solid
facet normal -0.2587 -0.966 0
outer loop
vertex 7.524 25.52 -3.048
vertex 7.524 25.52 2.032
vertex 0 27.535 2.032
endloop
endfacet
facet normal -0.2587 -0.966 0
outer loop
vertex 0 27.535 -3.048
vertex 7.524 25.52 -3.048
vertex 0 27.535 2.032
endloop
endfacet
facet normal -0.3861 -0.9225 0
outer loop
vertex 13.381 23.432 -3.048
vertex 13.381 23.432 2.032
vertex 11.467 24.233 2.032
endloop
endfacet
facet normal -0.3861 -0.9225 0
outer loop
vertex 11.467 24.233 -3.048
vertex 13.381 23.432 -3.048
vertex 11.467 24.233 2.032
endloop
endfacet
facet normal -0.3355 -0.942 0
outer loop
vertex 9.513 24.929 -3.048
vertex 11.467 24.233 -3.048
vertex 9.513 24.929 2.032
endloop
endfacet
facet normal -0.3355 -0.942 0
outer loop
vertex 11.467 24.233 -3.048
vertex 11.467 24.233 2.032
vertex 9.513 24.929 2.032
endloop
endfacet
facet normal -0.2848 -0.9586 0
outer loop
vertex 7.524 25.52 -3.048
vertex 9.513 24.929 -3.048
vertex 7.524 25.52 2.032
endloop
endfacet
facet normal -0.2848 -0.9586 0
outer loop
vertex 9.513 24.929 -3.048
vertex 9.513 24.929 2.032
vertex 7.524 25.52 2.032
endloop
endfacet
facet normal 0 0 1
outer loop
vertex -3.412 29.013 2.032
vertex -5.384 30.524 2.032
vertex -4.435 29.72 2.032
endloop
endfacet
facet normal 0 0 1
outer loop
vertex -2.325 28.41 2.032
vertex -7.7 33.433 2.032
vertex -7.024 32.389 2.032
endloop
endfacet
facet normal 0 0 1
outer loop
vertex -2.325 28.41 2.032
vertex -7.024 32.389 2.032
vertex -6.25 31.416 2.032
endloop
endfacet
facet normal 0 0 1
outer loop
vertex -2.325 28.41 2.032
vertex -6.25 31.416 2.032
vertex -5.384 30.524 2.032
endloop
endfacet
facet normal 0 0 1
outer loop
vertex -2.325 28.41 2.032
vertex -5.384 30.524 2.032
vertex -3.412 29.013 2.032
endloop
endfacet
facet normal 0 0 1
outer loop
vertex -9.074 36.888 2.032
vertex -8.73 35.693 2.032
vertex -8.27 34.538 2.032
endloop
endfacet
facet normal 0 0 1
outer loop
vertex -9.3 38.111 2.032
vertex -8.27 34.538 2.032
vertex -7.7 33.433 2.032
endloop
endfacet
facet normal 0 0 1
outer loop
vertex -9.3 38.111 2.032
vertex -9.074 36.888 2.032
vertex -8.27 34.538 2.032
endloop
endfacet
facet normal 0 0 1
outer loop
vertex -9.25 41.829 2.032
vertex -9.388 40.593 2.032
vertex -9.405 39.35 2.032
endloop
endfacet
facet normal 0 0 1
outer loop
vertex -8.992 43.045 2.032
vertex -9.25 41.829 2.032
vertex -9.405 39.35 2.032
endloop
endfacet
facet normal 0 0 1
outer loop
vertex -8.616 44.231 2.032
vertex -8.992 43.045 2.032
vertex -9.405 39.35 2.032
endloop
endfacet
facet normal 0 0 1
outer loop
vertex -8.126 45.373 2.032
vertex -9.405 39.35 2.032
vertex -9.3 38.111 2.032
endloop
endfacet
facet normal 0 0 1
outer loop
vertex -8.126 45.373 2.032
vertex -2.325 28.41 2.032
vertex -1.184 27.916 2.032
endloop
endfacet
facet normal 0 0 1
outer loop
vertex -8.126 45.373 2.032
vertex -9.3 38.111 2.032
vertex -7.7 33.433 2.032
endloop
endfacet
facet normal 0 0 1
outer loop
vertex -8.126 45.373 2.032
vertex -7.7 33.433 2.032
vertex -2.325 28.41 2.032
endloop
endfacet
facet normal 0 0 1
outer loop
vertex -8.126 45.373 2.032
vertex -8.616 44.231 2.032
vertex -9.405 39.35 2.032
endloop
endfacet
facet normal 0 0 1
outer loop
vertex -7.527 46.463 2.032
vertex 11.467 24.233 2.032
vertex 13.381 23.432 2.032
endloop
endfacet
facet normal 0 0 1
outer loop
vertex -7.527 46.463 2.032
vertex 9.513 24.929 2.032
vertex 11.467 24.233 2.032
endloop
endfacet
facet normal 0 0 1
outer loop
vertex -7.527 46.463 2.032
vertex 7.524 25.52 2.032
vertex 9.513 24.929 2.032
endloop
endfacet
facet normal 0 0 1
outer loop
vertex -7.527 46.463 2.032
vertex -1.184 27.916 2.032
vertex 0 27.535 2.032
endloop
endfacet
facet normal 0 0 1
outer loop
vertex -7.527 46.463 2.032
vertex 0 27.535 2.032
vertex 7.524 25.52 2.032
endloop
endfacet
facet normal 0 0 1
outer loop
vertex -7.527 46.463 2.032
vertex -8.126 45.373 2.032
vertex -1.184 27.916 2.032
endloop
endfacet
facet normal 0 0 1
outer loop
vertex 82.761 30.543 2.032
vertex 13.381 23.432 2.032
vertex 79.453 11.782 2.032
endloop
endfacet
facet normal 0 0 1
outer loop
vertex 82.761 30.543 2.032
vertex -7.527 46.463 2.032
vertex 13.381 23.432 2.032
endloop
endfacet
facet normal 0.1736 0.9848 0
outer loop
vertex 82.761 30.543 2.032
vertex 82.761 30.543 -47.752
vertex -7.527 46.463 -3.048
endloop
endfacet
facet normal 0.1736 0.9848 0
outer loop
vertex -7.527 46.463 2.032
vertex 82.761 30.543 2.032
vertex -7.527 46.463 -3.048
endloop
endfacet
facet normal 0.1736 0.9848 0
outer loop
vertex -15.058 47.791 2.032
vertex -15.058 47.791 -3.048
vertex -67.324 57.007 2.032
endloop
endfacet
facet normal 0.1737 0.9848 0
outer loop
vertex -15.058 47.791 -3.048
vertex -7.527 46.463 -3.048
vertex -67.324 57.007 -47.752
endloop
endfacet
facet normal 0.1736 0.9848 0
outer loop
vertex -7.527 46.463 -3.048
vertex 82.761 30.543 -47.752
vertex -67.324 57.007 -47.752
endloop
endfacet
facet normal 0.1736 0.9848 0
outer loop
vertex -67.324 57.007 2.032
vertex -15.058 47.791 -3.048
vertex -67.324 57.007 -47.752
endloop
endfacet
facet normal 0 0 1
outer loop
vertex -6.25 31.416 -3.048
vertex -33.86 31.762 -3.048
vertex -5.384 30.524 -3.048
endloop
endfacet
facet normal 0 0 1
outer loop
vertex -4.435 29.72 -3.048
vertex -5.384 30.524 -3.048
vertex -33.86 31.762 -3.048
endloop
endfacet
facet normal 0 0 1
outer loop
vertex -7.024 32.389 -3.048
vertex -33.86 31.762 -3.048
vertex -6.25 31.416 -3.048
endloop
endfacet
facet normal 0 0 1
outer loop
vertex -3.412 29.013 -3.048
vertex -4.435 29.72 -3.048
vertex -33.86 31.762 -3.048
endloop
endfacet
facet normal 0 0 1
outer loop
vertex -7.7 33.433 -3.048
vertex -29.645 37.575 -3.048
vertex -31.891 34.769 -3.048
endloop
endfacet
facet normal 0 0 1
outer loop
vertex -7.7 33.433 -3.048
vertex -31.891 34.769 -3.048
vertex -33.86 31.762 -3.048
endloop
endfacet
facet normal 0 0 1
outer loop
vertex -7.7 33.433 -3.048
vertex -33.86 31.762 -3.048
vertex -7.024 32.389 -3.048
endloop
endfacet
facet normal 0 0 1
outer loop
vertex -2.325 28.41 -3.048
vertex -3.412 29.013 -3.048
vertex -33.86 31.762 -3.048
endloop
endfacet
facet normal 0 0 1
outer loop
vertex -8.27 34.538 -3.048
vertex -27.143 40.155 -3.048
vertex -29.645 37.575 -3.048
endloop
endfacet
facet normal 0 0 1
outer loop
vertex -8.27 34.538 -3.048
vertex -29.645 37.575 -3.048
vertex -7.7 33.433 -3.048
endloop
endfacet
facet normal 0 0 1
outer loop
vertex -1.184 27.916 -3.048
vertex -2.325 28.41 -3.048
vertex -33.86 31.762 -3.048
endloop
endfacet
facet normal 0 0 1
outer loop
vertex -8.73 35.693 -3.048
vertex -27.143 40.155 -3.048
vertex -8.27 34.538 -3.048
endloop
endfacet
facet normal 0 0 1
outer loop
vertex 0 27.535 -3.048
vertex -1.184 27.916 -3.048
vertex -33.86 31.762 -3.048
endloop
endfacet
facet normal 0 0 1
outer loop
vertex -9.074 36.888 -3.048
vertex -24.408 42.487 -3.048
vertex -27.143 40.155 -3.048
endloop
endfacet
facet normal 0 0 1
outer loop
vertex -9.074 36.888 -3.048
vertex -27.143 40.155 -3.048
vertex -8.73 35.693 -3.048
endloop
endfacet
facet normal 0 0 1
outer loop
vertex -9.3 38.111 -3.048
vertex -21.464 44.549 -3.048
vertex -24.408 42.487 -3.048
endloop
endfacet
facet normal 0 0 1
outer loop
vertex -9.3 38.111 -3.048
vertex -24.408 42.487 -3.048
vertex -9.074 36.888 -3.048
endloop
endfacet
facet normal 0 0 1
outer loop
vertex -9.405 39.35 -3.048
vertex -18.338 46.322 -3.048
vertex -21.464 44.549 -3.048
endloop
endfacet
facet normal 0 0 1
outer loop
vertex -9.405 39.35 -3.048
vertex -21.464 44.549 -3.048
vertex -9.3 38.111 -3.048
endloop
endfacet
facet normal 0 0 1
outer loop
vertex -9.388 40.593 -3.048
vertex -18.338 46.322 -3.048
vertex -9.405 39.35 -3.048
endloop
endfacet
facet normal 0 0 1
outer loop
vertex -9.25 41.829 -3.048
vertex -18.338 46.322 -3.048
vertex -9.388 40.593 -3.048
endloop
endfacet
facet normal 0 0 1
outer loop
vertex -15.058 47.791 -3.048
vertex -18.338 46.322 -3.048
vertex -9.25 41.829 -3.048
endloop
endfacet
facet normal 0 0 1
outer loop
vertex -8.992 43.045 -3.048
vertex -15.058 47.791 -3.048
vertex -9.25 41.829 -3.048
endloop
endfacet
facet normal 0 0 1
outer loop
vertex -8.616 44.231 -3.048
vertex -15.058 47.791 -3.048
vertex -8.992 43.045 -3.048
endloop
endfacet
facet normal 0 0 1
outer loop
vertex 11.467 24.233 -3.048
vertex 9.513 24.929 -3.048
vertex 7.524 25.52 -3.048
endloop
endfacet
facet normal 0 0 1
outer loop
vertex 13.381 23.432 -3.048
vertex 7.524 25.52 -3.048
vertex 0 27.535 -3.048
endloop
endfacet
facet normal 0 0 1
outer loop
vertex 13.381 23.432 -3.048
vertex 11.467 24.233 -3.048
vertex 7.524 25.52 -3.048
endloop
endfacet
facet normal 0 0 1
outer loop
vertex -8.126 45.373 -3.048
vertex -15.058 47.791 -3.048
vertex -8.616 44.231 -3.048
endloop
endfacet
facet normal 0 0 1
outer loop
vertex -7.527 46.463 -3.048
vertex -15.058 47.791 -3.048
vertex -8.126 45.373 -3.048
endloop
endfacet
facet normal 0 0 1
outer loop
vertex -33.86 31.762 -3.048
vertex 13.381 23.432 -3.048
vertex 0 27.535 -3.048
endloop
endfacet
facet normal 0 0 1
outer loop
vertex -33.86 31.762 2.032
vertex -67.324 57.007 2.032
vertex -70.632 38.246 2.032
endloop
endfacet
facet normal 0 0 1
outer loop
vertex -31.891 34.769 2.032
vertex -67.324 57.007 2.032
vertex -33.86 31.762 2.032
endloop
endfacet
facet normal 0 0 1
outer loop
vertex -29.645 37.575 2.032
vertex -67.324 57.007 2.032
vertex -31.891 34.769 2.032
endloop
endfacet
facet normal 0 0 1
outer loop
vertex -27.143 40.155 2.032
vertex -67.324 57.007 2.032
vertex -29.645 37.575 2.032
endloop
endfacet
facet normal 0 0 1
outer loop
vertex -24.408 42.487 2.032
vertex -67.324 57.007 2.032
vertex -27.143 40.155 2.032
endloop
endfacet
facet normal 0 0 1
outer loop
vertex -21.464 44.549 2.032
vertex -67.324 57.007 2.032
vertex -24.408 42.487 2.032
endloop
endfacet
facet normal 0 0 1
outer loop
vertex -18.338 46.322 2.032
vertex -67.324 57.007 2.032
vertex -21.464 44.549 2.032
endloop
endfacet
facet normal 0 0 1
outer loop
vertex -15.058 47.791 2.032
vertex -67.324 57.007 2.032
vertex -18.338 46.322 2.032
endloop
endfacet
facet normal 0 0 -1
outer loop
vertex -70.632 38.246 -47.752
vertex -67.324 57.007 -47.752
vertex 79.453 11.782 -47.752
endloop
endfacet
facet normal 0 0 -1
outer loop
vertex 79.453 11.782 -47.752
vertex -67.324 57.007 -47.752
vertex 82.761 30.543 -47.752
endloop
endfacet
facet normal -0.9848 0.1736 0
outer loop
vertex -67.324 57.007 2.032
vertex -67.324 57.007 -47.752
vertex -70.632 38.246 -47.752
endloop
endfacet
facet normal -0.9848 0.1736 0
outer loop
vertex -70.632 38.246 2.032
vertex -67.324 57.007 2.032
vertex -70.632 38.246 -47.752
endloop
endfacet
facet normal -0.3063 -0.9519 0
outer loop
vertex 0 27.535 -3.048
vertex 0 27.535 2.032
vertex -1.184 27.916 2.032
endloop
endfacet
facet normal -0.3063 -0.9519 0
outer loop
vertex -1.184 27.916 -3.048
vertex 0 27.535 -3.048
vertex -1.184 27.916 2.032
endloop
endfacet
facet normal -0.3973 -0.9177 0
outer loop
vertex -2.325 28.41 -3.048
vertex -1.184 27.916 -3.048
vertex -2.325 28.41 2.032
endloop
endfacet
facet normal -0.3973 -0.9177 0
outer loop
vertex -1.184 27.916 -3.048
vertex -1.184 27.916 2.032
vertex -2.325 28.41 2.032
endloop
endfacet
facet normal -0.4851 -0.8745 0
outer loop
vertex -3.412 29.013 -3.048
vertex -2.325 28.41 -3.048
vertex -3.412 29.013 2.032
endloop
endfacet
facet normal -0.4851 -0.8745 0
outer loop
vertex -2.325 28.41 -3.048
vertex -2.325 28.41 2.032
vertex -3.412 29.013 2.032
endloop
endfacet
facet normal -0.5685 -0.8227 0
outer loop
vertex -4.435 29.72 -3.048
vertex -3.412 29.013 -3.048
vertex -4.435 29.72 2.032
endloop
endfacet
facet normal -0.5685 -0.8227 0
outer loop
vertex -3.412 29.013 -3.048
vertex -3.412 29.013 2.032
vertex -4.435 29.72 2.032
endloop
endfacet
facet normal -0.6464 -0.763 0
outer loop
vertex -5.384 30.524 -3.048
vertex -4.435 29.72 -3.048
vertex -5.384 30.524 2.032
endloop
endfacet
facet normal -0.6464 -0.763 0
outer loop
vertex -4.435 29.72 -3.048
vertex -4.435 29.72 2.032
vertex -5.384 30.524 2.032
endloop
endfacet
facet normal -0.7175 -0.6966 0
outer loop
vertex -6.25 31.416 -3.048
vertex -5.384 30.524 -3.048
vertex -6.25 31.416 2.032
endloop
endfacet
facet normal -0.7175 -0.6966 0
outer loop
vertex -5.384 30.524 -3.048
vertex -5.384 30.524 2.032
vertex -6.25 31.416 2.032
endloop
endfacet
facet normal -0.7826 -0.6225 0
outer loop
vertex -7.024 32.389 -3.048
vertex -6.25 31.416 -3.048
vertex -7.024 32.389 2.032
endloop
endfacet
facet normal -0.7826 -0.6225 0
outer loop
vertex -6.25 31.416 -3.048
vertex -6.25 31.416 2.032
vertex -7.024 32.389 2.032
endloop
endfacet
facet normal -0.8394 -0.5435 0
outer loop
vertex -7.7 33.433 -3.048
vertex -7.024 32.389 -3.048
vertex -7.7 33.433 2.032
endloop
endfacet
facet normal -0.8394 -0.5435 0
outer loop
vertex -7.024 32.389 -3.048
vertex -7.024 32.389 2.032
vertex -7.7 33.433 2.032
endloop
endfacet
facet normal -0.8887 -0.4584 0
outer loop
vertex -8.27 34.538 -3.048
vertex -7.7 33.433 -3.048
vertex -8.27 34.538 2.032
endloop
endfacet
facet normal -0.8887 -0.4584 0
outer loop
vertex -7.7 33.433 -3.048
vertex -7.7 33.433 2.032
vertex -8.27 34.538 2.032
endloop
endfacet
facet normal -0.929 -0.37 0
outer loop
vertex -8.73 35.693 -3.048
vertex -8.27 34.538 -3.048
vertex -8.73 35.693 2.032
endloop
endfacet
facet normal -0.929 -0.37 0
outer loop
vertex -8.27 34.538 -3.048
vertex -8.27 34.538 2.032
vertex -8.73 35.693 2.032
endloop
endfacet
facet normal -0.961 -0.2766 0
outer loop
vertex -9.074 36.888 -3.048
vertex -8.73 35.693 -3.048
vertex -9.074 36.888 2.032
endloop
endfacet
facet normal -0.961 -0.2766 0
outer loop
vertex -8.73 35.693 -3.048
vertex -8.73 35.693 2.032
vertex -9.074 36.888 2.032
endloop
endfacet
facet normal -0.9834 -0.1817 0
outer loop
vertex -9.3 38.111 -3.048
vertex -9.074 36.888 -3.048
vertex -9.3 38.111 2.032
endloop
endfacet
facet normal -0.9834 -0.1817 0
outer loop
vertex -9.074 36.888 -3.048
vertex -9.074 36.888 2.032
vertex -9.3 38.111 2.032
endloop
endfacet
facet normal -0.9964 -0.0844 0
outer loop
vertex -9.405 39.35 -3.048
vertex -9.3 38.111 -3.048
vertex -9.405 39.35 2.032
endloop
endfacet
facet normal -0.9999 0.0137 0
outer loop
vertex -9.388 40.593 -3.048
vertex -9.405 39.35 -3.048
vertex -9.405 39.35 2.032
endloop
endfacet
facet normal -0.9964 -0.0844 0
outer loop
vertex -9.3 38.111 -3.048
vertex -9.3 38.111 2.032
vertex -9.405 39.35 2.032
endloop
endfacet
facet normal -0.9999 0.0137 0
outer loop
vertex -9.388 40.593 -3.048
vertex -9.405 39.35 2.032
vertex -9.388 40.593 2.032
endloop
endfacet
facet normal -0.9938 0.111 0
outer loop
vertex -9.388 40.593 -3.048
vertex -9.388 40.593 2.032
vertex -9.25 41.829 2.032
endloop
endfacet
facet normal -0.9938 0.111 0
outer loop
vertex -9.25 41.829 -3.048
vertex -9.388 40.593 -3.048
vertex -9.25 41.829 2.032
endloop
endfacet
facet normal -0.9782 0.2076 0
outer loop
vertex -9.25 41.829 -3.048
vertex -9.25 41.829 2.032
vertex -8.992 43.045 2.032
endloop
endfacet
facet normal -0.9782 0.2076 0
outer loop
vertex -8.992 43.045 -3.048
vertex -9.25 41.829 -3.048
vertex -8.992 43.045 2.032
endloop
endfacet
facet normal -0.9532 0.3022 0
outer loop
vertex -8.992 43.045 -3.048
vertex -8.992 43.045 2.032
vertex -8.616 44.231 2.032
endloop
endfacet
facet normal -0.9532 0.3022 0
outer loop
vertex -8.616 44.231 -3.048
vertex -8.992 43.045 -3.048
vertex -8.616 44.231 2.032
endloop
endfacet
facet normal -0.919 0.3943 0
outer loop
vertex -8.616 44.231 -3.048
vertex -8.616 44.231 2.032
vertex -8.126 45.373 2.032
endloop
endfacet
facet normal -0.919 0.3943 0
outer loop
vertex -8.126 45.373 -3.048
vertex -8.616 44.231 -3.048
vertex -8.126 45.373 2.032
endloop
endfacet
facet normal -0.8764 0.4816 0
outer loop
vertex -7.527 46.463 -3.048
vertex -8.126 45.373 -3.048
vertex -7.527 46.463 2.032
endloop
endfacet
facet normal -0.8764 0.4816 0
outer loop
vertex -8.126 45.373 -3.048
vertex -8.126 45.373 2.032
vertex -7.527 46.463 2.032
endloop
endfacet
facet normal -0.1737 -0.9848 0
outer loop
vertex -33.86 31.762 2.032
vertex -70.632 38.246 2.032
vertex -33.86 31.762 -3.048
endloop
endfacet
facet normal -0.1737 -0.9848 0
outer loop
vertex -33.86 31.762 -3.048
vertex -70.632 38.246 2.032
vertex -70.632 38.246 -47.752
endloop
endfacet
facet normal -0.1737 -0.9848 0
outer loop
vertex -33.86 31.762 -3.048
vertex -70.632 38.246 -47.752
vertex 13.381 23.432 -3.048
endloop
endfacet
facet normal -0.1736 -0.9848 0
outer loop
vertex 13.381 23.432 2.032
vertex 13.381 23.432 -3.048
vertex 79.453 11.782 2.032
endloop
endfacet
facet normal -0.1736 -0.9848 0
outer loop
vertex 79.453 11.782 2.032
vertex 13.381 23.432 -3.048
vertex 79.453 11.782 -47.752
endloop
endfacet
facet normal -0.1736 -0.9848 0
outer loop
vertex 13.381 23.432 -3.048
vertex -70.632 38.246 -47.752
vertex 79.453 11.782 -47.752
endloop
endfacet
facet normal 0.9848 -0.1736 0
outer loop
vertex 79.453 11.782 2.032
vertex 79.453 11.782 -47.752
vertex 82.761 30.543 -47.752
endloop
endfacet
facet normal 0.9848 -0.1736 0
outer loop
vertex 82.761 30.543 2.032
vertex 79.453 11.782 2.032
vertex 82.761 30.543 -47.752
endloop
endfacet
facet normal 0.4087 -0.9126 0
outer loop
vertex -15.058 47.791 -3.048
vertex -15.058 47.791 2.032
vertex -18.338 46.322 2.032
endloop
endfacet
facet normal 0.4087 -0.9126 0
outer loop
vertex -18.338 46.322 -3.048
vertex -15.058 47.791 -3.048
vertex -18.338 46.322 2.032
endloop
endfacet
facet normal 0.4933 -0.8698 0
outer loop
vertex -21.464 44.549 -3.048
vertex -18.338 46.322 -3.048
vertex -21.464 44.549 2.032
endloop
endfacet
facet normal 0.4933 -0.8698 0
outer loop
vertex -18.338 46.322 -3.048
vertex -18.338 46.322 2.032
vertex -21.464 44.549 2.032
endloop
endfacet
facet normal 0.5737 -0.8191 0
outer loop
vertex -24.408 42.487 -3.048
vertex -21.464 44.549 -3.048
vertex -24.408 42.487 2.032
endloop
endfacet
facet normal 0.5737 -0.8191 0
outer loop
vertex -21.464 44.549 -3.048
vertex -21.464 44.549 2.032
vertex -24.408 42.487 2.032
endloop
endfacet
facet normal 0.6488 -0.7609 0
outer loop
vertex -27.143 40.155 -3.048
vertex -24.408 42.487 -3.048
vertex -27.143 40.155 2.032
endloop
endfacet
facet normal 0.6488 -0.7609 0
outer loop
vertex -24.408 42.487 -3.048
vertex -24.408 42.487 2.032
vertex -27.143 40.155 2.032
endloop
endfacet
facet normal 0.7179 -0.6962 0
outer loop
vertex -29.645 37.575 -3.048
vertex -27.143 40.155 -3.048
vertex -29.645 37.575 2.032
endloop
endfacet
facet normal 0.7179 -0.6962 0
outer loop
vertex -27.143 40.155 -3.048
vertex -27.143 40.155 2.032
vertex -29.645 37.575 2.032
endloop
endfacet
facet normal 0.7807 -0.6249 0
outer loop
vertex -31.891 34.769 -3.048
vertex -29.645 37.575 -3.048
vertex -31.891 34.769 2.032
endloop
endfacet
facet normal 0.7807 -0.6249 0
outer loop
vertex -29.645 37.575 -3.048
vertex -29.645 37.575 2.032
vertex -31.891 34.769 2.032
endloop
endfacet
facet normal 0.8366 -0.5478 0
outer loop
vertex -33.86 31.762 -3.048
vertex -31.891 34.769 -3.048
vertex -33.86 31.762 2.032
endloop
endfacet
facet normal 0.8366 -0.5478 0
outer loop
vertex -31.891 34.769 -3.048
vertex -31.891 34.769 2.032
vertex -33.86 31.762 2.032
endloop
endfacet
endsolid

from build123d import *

# Parameters (mm, degrees)
BOSS_EXTRUDE1_DEPTH        = 3.048
BOSS_EXTRUDE2_DEPTH        = 2.032
BOSS_EXTRUDE2_DEPTH_BACK   = 47.752
BOSS_EXTRUDE2_2_DEPTH      = 2.032
BOSS_EXTRUDE2_2_DEPTH_BACK = 47.752


with BuildPart() as part:
    # Sketch1 → Boss-Extrude1 (new, symmetric)
    with BuildSketch(Plane.XY):
        with BuildLine():
            ThreePointArc((0, 27.535484012), (-9.412998127, 39.802742006), (0, 52.07))
            Line((0, 52.07), (-11.040532194, 49.111698314))
            ThreePointArc((-11.040532194, 49.111698314), (-39.066320922, 14.192289272), (-14.190605813, -23.03684931))
            Line((-14.190605813, -23.03684931), (0, -28.201807432))
            ThreePointArc((0, -28.201807432), (8.35634418, -40.135903716), (0, -52.07))
            Line((0, -52.07), (10.740686656, -48.160709762))
            ThreePointArc((10.740686656, -48.160709762), (36.144496882, -10.141220984), (7.52373904, 25.519504212))
            Line((7.52373904, 25.519504212), (0, 27.535484012))
        make_face()
        with BuildLine():
            Line((-12.7, 7.332348419), (-1.374815329, 13.870946837))
            ThreePointArc((-1.374815329, 13.870946837), (-0.410875234, 16.198104087), (1.5875, 14.664696837))
            ThreePointArc((1.5875, 14.664696837), (1.533407249, 14.253821603), (1.374815329, 13.870946837))
            Line((1.374815329, 13.870946837), (12.7, 7.332348419))
            Line((12.7, 7.332348419), (12.7, -7.332348419))
            Line((12.7, -7.332348419), (0, -14.664696837))
            Line((0, -14.664696837), (-12.7, -7.332348419))
            Line((-12.7, -7.332348419), (-12.7, 7.332348419))
        make_face(mode=Mode.SUBTRACT)
    extrude(amount=BOSS_EXTRUDE1_DEPTH, both=True)


with BuildPart() as body_2:
    # Sketch2 → Boss-Extrude2 (new, two sides: drawn at the far end of the back side and taken through both)
    with BuildSketch(Plane.XY.offset(-BOSS_EXTRUDE2_DEPTH_BACK)):
        Polygon((-70.631687067, 38.246108065), (79.453014492, 11.782125788), (82.761012277, 30.542713483), (-67.323689282, 57.00669576), align=None)
    extrude(amount=BOSS_EXTRUDE2_DEPTH + BOSS_EXTRUDE2_DEPTH_BACK)


with BuildPart() as body_3:
    # Sketch2 → Boss-Extrude2 2 (new, two sides: drawn at the far end of the back side and taken through both)
    with BuildSketch(Plane.XY.offset(-BOSS_EXTRUDE2_2_DEPTH_BACK)):
        Polygon((-79.453014492, -11.782125788), (70.631687067, -38.246108065), (67.323689282, -57.00669576), (-82.761012277, -30.542713483), align=None)
    extrude(amount=BOSS_EXTRUDE2_2_DEPTH + BOSS_EXTRUDE2_2_DEPTH_BACK)


with BuildPart() as body_2_1:
    add(body_2.part)

    # Intersect1: read off the stored shape, not the designer's step
    # Intersect1: cut body 3, part
    add(body_3.part, mode=Mode.SUBTRACT)
    add(part.part, mode=Mode.SUBTRACT)


solid = body_2_1.part
